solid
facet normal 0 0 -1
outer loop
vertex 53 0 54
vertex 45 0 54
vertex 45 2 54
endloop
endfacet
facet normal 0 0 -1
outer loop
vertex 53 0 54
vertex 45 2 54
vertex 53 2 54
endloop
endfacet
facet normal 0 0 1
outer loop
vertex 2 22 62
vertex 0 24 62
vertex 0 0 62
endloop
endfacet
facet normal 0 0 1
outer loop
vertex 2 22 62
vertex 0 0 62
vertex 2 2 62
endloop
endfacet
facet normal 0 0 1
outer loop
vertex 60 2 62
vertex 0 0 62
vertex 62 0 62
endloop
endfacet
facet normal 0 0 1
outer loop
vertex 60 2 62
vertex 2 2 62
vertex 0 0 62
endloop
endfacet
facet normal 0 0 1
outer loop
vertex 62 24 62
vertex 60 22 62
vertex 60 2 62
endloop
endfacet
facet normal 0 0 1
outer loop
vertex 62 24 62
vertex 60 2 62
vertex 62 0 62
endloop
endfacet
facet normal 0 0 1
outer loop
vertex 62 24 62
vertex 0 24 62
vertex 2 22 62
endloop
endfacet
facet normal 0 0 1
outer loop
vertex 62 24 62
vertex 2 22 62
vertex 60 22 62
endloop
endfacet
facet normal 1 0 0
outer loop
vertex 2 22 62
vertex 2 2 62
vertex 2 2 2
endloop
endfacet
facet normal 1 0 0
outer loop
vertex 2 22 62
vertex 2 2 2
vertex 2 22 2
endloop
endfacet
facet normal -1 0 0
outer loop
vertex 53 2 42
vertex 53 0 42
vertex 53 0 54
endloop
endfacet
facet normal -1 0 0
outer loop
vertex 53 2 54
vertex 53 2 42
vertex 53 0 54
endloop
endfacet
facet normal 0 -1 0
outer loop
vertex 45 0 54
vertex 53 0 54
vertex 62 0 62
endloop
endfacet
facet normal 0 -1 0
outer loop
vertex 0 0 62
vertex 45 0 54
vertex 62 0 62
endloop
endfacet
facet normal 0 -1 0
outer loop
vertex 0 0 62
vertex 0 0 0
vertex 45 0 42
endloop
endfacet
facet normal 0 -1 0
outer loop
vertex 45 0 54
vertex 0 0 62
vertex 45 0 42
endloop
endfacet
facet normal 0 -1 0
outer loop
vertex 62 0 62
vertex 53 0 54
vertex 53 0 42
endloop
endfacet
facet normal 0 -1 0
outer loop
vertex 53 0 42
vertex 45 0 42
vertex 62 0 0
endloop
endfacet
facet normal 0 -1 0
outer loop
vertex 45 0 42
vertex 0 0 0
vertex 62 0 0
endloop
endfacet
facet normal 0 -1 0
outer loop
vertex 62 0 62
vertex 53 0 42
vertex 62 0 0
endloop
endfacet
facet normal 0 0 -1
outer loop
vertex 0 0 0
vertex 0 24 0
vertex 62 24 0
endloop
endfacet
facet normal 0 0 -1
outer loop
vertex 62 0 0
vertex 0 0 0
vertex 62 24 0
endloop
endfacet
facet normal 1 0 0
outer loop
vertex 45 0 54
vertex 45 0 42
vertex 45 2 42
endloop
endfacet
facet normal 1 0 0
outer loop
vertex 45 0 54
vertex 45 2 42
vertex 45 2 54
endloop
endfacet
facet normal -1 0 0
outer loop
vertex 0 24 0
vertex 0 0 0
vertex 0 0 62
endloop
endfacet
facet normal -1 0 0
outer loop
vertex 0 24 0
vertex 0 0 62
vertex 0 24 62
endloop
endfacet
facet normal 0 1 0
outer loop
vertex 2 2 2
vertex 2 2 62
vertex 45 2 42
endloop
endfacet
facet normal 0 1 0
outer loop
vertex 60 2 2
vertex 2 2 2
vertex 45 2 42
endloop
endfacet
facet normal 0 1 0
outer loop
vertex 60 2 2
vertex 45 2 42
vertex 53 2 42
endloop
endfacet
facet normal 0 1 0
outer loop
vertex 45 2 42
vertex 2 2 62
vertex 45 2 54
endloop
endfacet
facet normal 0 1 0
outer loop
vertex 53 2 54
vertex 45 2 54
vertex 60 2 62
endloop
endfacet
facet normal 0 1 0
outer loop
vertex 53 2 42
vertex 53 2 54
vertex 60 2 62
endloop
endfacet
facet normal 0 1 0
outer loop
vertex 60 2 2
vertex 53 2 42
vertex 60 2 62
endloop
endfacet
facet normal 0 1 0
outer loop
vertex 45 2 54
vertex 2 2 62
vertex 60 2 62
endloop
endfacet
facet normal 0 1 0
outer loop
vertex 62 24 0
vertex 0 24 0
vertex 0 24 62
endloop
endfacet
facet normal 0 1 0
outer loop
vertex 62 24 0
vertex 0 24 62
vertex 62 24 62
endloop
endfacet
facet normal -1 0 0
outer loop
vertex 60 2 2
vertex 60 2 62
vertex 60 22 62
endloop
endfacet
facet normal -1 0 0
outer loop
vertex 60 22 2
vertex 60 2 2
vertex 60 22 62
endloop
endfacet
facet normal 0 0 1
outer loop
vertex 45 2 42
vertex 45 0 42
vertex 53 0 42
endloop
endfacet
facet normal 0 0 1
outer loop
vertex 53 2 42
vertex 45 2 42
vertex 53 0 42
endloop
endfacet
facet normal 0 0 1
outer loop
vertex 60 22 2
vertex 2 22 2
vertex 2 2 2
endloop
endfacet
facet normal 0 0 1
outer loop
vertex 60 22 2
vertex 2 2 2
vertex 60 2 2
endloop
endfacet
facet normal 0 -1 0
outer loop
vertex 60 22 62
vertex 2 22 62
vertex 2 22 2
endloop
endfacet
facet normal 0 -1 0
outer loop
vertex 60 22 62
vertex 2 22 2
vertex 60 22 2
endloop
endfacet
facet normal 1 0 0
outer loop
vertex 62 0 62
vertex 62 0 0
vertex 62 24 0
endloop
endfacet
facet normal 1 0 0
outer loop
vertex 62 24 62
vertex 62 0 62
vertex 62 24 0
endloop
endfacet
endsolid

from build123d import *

# Parameters (mm, degrees)
SKETCH_W        = 62
SKETCH_H        = 24
PAD_DEPTH       = 62
SKETCH001_W     = 58
SKETCH001_H     = 20
POCKET_DEPTH    = 60
SKETCH002_W     = 8
SKETCH002_H     = 12
POCKET001_DEPTH = 2


with BuildPart() as part:
    # Sketch → Pad (new body)
    with BuildSketch(Plane.XY):
        with Locations((31, 12)):
            Rectangle(SKETCH_W, SKETCH_H)
    extrude(amount=PAD_DEPTH)

    # Sketch001 (on Face6 of Pad) → Pocket (cut)
    with BuildSketch(Plane.XY.offset(62)):
        with Locations((31, 12)):
            Rectangle(SKETCH001_W, SKETCH001_H)
    extrude(amount=-POCKET_DEPTH, mode=Mode.SUBTRACT)

    # Sketch002 (on Face1 of Pocket) → Pocket001 (cut)
    with BuildSketch(Plane.XZ):
        with Locations((49, 48)):
            Rectangle(SKETCH002_W, SKETCH002_H)
    extrude(amount=-POCKET001_DEPTH, mode=Mode.SUBTRACT)


solid = part.part
